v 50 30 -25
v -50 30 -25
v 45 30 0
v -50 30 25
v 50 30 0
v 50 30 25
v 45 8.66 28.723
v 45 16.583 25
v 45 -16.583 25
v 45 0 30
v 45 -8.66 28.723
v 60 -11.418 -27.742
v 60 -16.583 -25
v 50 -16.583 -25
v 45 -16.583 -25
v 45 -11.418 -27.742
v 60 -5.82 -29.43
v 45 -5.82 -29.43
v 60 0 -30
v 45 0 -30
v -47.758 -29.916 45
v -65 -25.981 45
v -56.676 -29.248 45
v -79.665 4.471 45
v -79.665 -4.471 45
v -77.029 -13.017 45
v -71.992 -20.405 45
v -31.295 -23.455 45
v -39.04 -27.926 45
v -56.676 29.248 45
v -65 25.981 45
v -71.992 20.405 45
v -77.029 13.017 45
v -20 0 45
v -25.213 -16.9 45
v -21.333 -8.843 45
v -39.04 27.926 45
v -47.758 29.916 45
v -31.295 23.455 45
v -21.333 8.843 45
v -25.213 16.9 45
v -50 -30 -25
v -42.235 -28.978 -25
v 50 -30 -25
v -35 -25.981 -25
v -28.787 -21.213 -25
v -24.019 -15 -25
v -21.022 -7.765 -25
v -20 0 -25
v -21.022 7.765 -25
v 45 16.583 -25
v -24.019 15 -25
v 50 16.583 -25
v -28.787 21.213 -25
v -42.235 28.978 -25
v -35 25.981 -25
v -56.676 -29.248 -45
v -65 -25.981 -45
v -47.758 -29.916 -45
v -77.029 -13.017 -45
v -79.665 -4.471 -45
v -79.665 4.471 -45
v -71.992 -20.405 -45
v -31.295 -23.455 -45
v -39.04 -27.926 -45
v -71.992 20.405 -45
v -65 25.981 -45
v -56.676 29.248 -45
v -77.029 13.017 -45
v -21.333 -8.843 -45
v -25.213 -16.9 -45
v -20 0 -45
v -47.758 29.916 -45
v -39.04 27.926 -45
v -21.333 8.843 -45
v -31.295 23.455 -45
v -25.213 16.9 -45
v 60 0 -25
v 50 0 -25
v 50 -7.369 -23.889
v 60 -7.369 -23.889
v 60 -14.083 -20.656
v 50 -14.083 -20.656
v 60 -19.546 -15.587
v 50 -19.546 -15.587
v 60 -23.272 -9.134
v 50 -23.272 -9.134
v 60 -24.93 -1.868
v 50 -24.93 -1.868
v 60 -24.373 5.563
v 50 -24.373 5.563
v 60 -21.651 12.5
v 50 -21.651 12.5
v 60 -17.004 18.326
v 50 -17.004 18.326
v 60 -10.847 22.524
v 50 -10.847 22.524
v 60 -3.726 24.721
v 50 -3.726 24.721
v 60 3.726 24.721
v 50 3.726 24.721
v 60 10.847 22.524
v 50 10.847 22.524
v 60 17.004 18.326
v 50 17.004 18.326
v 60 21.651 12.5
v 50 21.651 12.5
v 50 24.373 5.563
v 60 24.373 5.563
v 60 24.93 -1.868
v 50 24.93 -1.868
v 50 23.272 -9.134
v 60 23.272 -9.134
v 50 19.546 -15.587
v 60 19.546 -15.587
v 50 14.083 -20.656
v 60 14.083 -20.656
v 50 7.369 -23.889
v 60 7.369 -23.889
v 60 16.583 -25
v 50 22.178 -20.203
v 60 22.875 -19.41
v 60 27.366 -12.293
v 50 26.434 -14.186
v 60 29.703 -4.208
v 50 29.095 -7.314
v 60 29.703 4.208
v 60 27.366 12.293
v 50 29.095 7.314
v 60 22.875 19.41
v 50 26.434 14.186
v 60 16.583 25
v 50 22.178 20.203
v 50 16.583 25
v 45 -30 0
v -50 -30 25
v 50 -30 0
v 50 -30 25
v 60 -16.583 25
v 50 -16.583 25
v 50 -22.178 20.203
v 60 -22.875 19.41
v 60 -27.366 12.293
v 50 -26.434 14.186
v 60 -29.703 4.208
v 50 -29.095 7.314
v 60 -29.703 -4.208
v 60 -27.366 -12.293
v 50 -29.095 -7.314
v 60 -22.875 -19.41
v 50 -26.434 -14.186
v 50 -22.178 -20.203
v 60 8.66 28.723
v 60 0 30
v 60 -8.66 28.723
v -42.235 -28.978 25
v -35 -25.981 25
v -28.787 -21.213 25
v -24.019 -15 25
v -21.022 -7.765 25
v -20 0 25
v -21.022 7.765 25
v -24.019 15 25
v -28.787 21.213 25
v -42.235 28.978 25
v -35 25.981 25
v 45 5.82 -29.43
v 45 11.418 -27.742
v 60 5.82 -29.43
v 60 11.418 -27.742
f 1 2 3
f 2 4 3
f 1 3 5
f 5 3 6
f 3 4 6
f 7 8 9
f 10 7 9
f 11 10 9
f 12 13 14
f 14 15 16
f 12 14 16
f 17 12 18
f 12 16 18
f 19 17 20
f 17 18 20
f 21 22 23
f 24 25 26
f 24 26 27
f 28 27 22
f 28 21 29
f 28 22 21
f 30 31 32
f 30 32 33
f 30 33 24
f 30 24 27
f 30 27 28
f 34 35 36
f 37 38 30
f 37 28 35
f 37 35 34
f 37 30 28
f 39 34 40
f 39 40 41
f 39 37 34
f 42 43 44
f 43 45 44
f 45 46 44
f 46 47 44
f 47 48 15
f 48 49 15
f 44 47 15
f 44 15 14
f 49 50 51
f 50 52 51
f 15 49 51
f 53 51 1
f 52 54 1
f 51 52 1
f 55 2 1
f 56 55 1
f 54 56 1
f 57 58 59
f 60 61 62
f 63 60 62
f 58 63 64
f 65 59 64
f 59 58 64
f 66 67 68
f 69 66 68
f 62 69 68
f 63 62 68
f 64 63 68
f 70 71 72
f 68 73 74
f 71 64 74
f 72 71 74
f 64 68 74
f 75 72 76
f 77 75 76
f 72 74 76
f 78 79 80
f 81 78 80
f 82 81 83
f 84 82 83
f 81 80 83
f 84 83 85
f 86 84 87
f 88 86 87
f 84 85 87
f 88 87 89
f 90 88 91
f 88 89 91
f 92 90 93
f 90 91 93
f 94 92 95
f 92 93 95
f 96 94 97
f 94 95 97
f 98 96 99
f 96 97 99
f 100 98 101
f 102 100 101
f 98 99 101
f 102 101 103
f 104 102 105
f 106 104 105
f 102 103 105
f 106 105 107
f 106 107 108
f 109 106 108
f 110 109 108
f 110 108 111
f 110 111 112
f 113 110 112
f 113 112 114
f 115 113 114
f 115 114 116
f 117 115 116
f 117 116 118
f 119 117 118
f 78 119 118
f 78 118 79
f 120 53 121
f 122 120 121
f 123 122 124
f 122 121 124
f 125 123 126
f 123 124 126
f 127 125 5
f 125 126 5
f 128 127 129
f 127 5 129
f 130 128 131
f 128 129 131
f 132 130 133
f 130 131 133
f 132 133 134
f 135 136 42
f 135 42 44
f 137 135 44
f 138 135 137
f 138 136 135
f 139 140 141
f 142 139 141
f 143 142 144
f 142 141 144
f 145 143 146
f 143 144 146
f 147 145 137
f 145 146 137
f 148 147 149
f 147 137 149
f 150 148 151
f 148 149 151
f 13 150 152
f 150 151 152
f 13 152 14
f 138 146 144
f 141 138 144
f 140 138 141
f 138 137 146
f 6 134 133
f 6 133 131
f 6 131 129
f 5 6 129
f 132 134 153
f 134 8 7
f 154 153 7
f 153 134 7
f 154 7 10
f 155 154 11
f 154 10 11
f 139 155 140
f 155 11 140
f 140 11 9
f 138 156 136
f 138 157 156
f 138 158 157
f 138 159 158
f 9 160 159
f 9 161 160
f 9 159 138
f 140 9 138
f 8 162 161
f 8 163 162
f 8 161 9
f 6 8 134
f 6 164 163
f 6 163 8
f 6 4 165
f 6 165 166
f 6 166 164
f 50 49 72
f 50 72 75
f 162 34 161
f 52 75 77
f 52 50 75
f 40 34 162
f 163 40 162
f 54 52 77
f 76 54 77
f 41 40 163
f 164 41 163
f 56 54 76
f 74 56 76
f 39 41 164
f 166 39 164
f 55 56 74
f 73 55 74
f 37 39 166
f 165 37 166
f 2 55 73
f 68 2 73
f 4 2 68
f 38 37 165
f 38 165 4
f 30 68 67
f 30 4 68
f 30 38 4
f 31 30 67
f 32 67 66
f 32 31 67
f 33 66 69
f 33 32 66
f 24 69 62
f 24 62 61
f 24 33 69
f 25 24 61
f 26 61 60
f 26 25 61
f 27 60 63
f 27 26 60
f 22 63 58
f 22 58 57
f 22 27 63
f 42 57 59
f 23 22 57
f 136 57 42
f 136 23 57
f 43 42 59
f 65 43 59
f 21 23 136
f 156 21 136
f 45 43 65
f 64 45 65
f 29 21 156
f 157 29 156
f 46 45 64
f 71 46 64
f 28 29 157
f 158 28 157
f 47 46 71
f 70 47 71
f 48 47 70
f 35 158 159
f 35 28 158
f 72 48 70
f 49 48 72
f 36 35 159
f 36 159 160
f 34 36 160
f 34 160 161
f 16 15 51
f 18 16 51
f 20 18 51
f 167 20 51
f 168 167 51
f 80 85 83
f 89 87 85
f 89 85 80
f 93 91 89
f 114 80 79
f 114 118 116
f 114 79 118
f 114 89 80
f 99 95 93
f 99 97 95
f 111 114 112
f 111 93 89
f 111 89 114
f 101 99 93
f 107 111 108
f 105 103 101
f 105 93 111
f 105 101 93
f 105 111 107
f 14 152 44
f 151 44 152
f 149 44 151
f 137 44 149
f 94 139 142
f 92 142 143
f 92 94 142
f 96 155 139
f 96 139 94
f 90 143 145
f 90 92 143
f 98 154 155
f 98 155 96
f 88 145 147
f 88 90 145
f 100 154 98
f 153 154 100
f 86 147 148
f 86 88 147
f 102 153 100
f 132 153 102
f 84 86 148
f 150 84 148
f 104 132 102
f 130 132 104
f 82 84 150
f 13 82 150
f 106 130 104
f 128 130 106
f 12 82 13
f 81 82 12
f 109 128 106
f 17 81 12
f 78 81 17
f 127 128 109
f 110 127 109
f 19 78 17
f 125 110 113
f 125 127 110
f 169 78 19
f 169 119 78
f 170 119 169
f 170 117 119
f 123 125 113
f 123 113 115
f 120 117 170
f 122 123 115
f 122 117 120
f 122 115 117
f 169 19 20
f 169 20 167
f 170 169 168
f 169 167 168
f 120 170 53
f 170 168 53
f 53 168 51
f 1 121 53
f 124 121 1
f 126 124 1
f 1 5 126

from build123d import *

# Parameters (mm, degrees)
SKETCH3_W                = 100
SKETCH3_H                = 60
BOSS_EXTRUDE3_DEPTH      = 25
SKETCH4_R                = 30
BOSS_EXTRUDE5_DEPTH      = 45
BOSS_EXTRUDE9_DEPTH      = 10
BOSS_EXTRUDE9_DEPTH_BACK = 5


with BuildPart() as part:
    # Sketch3 → Boss-Extrude3 (new, symmetric)
    with BuildSketch(Plane.XY):
        Rectangle(SKETCH3_W, SKETCH3_H)
    extrude(amount=BOSS_EXTRUDE3_DEPTH, both=True)

    # Sketch4 → Boss-Extrude5 (add, symmetric)
    with BuildSketch(Plane.XY):
        with Locations((-50, 0)):
            Circle(SKETCH4_R)
    extrude(amount=BOSS_EXTRUDE5_DEPTH, both=True)

    # Sketch5 → Boss-Extrude9 (add, two sides: drawn at the far end of the back side and taken through both)
    with BuildSketch(Plane(origin=(50, 0, 0), x_dir=(0, 0, -1), z_dir=(1, 0, 0)).offset(-BOSS_EXTRUDE9_DEPTH_BACK)):
        with BuildLine():
            Line((-25, 2.6e-08), (-25, 16.583123952))
            ThreePointArc((-25, 16.583123952), (-30, 0), (-25, -16.583123952))
            Line((-25, -16.583123952), (-25, 2.6e-08))
        make_face()
        with BuildLine():
            Line((25, 0), (25, 16.583123952))
            ThreePointArc((25, 16.583123952), (0, 30), (-25, 16.583123952))
            Line((-25, 16.583123952), (-25, 2.6e-08))
            ThreePointArc((-25, 2.6e-08), (1.3e-08, 25), (25, 0))
        make_face()
        with BuildLine():
            ThreePointArc((-25, -16.583123952), (0, -30), (25, -16.583123952))
            Line((25, -16.583123952), (25, 0))
            ThreePointArc((25, 0), (-1.3e-08, -25), (-25, 2.6e-08))
            Line((-25, 2.6e-08), (-25, -16.583123952))
        make_face()
        with BuildLine():
            ThreePointArc((25, -16.583123952), (28.722813233, -8.660254038), (30, 0))
            ThreePointArc((30, 0), (28.722813233, 8.660254038), (25, 16.583123952))
            Line((25, 16.583123952), (25, 0))
            Line((25, 0), (25, -16.583123952))
        make_face()
    extrude(amount=BOSS_EXTRUDE9_DEPTH + BOSS_EXTRUDE9_DEPTH_BACK)


solid = part.part
